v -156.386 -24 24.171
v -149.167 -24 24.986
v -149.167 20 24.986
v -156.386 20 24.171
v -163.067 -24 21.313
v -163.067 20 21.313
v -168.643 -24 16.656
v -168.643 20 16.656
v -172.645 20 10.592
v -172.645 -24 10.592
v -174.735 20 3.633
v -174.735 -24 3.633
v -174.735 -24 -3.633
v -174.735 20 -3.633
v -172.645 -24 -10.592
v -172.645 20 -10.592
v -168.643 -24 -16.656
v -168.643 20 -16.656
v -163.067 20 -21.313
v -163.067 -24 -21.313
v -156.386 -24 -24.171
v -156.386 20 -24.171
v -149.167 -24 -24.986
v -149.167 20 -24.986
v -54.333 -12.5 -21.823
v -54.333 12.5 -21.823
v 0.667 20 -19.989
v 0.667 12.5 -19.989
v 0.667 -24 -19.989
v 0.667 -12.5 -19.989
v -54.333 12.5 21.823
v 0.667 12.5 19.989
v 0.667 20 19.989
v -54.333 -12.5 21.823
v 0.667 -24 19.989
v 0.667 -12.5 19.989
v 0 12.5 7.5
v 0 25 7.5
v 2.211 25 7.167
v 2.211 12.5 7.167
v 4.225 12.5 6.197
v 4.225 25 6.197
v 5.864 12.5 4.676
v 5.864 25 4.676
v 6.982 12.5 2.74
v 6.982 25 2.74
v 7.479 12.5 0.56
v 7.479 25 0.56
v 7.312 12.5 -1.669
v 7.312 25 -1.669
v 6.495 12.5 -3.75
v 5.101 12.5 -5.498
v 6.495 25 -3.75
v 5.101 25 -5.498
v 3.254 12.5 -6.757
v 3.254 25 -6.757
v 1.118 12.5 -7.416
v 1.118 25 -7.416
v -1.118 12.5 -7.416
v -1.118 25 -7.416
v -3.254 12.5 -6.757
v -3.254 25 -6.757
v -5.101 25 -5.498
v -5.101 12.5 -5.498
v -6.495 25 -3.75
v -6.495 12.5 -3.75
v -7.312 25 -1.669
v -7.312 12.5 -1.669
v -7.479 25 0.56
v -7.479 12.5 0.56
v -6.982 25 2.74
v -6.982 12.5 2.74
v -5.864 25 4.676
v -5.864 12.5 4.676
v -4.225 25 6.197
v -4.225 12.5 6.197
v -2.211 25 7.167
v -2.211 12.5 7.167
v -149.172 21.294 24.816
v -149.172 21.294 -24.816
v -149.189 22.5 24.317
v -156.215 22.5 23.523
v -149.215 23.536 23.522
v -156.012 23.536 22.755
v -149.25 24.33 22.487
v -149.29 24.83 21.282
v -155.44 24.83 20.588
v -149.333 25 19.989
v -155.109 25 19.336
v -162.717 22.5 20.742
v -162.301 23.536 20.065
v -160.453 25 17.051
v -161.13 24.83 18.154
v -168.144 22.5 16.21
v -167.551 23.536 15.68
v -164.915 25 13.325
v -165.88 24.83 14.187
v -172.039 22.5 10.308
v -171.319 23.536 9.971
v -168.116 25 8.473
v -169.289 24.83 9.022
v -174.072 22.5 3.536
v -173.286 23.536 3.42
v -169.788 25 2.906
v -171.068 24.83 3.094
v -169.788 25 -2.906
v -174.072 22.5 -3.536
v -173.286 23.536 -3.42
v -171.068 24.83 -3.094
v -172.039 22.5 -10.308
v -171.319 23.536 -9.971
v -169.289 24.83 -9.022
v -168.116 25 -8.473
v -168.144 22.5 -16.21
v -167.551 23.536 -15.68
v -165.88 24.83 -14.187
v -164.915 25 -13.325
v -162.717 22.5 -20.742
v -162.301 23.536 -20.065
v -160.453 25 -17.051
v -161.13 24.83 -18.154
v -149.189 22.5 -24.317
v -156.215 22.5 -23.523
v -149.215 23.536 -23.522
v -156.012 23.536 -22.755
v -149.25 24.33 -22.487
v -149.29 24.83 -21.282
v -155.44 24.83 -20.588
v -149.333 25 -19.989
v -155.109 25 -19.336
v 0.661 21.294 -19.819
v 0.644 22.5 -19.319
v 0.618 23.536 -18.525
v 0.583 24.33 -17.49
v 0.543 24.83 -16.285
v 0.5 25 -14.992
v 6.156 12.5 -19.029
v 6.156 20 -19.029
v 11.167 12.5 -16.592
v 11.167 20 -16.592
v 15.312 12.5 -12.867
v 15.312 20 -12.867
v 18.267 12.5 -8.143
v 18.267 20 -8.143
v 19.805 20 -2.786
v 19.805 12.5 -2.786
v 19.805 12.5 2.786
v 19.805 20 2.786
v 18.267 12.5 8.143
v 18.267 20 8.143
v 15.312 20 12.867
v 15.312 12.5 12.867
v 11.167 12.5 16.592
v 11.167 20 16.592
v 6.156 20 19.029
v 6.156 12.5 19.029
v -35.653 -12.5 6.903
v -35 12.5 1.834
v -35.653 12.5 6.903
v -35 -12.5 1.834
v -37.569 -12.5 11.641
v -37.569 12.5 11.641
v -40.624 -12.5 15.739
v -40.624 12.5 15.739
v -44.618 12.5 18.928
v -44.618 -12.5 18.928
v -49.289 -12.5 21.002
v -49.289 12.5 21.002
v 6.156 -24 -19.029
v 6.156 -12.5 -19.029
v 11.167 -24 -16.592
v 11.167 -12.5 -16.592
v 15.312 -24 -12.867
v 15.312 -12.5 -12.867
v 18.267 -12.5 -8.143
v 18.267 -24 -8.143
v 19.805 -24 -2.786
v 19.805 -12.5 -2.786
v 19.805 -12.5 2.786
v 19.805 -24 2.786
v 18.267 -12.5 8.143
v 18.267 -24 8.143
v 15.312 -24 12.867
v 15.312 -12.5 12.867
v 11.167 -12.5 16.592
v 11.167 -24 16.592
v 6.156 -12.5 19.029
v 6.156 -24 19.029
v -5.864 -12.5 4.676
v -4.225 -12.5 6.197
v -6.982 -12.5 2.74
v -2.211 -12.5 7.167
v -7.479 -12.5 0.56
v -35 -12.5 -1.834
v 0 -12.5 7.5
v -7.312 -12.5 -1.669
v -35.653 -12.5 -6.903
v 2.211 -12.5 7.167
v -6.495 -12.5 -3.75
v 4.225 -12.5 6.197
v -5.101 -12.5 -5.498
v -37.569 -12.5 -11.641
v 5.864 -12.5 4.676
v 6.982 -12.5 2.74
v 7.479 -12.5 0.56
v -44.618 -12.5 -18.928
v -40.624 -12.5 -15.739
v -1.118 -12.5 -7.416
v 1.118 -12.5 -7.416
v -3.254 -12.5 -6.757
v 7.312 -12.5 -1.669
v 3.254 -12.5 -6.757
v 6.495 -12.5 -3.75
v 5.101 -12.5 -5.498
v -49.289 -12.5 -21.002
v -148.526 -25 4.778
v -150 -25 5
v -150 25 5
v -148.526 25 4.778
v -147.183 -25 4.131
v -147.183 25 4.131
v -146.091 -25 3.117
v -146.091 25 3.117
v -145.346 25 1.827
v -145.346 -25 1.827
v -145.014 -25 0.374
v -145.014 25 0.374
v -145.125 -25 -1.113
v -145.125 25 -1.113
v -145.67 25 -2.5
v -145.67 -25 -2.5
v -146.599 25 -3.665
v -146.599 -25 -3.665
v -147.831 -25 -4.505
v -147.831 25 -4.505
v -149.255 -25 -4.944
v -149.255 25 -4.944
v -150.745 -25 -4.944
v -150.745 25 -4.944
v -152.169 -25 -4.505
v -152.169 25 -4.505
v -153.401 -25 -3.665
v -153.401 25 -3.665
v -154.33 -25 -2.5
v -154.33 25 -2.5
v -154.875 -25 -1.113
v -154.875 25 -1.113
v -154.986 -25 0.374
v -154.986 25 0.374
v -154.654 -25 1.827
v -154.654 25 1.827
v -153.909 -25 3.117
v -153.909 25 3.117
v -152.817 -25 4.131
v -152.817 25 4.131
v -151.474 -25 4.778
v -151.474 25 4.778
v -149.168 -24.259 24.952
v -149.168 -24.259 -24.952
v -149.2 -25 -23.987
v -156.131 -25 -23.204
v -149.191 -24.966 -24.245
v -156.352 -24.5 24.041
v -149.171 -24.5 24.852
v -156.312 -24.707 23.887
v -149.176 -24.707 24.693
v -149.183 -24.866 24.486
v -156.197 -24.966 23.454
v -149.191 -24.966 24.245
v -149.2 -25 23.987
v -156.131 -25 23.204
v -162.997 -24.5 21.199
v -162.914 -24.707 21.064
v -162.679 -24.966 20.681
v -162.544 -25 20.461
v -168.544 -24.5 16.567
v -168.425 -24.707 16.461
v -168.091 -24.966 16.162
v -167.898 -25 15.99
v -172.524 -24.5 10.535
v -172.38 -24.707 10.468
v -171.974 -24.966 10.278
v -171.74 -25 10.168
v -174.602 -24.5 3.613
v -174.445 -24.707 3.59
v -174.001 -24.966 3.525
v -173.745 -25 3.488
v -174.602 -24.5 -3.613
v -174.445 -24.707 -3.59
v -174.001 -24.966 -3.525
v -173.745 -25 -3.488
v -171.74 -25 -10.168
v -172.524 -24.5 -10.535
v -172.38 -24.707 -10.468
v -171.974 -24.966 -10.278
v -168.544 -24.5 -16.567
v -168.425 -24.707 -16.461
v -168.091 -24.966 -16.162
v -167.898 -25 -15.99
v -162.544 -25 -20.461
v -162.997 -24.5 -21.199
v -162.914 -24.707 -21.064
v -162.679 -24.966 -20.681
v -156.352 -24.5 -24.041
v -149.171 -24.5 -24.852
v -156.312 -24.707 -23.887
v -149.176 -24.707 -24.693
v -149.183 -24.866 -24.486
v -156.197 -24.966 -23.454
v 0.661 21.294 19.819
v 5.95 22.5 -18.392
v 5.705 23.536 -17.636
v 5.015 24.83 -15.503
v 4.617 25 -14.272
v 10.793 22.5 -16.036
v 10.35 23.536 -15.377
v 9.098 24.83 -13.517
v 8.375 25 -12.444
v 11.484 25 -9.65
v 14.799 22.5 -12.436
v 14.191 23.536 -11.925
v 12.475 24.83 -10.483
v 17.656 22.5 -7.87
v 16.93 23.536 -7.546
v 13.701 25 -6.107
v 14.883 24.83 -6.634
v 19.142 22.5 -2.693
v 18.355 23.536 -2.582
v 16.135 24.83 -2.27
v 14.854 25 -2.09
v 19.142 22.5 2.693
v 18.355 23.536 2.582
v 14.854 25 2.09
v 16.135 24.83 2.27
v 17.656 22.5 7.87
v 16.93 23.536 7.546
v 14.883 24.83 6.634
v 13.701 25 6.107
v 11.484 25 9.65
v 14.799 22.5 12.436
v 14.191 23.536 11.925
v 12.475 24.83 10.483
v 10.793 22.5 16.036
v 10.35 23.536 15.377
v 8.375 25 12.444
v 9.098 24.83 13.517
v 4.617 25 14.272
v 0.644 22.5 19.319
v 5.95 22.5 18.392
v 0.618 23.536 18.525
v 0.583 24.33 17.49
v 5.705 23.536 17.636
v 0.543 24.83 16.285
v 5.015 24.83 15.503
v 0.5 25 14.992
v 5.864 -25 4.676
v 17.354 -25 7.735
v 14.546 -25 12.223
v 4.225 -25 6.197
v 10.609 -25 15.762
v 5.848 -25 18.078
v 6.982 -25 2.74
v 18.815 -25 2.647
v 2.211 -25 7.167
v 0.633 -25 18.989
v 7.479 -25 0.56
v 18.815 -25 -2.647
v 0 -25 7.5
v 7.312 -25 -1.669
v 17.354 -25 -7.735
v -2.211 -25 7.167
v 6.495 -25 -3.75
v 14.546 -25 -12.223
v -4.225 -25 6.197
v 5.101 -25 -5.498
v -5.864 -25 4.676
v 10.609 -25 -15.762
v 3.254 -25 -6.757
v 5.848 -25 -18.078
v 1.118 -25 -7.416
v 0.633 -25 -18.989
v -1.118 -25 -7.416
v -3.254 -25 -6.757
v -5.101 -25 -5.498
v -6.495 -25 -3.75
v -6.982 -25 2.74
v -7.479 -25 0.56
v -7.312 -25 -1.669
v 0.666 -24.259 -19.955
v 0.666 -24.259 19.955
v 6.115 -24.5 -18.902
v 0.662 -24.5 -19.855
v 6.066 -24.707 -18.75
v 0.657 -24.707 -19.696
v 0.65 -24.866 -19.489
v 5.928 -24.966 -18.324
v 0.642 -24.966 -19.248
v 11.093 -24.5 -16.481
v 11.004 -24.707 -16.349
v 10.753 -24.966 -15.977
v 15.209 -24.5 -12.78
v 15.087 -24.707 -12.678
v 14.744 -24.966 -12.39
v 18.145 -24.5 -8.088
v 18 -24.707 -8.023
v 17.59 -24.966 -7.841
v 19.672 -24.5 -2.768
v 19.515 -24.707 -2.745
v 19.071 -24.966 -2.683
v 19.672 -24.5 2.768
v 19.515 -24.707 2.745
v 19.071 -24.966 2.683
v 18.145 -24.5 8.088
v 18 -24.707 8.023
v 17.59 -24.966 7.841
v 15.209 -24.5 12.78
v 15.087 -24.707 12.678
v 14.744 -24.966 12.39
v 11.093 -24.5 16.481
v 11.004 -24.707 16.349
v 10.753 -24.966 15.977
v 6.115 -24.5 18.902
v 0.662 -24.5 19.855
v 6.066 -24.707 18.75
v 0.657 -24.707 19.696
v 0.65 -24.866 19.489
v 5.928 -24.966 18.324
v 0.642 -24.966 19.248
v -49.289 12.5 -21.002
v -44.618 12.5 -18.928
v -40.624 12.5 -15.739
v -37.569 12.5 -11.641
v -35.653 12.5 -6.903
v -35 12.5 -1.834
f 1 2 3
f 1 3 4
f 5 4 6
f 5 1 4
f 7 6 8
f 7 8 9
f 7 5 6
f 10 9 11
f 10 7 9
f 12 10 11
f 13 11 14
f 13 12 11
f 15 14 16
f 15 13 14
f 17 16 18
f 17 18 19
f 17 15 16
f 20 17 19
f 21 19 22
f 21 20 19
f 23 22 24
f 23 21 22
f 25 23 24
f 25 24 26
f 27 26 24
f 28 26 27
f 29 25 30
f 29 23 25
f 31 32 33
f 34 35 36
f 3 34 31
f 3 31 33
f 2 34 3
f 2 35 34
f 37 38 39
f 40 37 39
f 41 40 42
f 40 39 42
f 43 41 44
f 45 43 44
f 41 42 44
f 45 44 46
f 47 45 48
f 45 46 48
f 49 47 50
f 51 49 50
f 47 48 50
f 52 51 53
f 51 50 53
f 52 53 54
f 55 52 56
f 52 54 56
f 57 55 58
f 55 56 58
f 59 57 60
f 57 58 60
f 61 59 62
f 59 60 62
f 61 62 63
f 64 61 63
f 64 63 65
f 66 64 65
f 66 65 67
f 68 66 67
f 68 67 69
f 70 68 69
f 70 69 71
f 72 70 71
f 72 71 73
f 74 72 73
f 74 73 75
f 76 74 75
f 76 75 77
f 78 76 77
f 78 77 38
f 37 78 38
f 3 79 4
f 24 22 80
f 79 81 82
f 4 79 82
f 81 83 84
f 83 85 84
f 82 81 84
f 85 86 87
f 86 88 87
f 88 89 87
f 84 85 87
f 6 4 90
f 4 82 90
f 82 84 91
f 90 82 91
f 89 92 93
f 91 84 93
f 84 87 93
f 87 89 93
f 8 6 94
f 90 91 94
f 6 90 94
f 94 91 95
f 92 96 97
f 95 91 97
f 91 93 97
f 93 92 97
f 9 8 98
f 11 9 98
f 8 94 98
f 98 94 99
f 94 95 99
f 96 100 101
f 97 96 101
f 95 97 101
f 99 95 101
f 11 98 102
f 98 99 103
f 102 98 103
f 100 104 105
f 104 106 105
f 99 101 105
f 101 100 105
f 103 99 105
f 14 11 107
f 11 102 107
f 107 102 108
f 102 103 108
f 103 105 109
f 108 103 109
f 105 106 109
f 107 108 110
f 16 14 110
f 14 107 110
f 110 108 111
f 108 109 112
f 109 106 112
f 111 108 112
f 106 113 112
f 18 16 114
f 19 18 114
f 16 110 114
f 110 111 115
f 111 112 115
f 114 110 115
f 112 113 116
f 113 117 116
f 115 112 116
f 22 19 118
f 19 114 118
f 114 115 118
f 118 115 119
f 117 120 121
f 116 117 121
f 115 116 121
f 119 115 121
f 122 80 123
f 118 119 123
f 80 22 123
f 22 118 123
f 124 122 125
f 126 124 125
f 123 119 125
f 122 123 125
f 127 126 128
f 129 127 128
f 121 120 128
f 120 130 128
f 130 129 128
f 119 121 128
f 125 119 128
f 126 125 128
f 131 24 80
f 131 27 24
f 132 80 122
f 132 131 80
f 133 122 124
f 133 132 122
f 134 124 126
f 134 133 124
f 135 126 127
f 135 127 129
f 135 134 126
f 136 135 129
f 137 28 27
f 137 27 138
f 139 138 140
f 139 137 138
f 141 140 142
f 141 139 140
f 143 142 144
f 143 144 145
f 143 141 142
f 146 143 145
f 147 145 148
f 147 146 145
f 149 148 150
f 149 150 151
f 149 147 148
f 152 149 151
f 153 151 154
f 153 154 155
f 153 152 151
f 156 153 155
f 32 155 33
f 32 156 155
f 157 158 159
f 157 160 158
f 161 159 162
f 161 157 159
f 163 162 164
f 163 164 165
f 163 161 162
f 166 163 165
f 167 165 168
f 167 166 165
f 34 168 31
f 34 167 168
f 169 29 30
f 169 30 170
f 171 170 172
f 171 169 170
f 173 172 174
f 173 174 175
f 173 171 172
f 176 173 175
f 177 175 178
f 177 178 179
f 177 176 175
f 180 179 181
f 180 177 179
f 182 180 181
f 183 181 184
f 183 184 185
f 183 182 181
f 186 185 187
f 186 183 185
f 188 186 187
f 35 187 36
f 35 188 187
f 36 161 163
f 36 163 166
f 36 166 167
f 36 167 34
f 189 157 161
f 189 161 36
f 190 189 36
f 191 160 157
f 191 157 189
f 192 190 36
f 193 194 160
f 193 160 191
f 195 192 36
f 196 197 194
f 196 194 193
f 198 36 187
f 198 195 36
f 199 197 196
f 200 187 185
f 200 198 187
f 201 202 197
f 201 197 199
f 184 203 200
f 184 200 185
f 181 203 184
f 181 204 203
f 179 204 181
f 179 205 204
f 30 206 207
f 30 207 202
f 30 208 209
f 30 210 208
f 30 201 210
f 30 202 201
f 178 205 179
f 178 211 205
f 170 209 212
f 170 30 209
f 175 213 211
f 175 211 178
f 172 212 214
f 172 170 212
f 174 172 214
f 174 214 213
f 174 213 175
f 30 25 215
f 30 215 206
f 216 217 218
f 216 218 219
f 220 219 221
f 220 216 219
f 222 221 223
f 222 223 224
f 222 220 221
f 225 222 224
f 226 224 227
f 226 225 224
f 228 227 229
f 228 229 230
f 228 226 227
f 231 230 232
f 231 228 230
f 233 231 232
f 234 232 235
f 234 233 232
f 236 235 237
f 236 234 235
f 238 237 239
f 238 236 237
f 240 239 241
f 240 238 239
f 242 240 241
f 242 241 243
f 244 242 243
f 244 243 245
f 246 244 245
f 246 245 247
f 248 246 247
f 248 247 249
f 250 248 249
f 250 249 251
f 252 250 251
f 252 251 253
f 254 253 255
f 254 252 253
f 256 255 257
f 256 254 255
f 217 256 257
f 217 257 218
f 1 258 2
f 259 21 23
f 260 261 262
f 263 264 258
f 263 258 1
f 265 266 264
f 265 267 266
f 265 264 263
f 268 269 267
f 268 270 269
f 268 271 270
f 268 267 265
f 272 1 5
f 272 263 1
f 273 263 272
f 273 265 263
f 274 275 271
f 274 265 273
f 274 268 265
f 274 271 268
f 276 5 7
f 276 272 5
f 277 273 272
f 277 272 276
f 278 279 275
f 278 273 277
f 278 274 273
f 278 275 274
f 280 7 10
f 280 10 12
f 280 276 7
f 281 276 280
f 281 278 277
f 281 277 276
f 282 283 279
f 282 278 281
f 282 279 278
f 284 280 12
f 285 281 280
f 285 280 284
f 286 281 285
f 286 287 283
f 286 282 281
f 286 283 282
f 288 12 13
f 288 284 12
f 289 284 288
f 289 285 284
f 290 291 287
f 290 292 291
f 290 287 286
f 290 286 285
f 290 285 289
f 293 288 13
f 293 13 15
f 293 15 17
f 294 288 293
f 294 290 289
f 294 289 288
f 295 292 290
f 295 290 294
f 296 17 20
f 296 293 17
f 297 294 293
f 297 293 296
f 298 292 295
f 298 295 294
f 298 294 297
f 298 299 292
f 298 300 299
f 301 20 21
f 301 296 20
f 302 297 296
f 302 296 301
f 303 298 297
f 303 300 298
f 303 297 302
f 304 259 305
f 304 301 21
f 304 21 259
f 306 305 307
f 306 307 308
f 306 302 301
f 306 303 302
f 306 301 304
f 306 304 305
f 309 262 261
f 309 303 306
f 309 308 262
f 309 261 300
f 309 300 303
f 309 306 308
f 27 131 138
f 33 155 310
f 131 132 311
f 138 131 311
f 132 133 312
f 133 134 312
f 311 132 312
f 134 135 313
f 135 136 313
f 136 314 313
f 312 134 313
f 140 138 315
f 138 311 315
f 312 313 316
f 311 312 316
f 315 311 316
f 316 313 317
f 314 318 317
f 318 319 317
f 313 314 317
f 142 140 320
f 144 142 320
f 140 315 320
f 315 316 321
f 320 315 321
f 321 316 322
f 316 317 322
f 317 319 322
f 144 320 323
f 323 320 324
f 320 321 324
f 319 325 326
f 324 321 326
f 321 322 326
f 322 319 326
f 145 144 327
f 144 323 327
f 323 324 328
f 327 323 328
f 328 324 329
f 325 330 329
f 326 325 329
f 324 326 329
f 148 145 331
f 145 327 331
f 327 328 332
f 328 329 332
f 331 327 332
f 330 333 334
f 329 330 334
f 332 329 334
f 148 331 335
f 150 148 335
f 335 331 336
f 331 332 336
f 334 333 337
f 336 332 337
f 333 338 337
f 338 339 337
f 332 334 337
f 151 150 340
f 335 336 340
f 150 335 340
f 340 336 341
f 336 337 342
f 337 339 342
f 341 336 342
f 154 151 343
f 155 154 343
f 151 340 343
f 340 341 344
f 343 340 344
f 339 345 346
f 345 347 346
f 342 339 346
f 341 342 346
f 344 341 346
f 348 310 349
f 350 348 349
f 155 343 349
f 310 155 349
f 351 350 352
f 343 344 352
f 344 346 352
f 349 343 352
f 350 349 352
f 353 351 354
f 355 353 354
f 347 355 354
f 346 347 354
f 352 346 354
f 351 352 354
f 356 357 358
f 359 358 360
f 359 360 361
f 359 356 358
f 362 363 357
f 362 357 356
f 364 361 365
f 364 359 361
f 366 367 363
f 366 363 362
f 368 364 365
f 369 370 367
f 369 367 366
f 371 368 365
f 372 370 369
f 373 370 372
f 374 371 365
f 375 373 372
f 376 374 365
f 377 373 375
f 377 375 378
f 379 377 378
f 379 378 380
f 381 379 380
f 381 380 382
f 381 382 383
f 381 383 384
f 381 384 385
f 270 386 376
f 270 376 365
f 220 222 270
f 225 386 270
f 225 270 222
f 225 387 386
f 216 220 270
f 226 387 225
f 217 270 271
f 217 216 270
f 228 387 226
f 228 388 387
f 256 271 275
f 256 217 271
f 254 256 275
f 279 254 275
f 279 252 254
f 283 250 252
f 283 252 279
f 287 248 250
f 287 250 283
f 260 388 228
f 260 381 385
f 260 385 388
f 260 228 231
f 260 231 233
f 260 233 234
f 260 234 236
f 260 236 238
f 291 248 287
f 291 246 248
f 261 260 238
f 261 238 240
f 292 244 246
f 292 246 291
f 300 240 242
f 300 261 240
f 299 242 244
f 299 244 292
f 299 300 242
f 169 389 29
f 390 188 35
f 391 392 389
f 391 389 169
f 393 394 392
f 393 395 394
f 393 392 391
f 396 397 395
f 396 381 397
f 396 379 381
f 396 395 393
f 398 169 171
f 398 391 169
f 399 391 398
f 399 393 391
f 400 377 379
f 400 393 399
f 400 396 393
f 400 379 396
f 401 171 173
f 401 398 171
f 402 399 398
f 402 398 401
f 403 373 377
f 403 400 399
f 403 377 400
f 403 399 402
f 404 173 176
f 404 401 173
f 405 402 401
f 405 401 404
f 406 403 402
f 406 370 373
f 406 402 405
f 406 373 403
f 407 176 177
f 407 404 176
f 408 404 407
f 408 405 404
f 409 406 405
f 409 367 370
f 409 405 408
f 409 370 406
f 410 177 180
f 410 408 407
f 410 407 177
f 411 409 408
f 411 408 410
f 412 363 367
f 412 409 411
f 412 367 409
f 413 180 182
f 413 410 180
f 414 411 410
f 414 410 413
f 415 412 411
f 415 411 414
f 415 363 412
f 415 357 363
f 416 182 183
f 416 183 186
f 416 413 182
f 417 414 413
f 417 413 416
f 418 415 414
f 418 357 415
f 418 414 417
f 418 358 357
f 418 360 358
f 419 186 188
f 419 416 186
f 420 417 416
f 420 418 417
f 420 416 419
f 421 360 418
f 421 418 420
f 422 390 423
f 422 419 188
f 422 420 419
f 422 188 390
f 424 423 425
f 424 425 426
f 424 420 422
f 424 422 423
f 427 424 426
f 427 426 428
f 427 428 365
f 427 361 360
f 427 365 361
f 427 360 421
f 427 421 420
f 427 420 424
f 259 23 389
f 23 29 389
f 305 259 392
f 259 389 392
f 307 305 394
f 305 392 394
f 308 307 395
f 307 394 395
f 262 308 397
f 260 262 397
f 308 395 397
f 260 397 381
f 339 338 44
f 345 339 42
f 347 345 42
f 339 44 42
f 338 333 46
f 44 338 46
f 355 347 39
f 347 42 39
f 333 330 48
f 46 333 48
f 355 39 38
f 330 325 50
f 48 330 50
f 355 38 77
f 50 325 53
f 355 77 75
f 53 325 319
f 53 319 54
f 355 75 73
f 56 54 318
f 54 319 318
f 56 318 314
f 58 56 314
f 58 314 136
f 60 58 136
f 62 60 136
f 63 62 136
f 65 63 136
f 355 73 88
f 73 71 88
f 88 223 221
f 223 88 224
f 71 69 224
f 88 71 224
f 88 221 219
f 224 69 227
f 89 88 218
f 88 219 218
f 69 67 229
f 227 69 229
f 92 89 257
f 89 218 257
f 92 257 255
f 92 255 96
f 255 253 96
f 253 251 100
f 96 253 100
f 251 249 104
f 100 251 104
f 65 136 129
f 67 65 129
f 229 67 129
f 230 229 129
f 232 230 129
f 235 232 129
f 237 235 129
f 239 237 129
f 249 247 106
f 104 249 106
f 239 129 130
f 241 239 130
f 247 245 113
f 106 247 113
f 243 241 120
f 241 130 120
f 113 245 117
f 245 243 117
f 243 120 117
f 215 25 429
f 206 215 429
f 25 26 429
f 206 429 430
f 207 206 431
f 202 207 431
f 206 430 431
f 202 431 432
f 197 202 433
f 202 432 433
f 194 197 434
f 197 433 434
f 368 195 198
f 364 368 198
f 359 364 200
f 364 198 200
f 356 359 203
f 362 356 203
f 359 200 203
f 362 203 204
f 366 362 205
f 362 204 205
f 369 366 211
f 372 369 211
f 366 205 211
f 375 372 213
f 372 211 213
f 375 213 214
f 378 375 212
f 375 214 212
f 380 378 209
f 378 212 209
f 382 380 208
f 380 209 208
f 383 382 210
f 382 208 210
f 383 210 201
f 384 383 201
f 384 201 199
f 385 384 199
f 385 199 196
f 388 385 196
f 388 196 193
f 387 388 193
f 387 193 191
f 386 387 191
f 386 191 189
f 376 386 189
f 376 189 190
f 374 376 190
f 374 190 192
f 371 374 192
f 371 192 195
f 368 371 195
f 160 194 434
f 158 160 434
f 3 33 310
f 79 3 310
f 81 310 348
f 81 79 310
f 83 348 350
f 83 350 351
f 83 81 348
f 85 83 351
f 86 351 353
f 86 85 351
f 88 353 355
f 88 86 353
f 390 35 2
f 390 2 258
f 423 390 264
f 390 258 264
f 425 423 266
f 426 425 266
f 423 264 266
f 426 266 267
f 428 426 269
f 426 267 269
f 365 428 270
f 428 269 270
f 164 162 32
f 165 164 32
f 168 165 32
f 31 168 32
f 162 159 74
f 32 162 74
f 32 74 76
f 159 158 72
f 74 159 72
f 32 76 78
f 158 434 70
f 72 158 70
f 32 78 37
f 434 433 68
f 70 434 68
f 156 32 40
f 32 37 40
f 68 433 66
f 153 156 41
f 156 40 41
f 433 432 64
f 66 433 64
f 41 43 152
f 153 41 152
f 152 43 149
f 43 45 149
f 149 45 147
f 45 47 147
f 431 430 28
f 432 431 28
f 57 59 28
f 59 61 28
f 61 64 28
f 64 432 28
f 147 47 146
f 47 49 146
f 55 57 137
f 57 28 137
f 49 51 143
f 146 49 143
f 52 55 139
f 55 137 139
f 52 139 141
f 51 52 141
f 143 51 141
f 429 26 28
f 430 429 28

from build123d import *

# Parameters (mm, degrees)
SALIENTE_EXTRUIR1_DEPTH      = 25
SALIENTE_EXTRUIR1_DEPTH_BACK = 25
CROQUIS1_R                   = 5
REDONDEO9_R                  = 1
CORTAR_EXTRUIR1_DEPTH        = 49
CORTAR_EXTRUIR1_DEPTH_BACK   = 47
CROQUIS3_W                   = 70
CROQUIS3_H                   = 25
REDONDEO10_R                 = 20
CROQUIS4_R                   = 7.5
CORTAR_EXTRUIR2_DEPTH        = 65
REDONDEO11_R                 = 5


with BuildPart() as part:
    # Croquis1 → Saliente-Extruir1 (new, two sides: drawn at the far end of the back side and taken through both)
    with BuildSketch(Plane(origin=(0, 0, 0), x_dir=(1, 0, 0), z_dir=(0, 1, 0)).offset(-SALIENTE_EXTRUIR1_DEPTH_BACK)):
        with BuildLine():
            Line((-149.166666667, 24.986107251), (0.666666667, 19.988885801))
            ThreePointArc((0.666666667, 19.988885801), (20, 0), (0.666666667, -19.988885801))
            Line((0.666666667, -19.988885801), (-149.166666667, -24.986107251))
            ThreePointArc((-149.166666667, -24.986107251), (-175, 0), (-149.166666667, 24.986107251))
        make_face()
        with Locations((-150, 0)):
            Circle(CROQUIS1_R, mode=Mode.SUBTRACT)
    extrude(amount=SALIENTE_EXTRUIR1_DEPTH + SALIENTE_EXTRUIR1_DEPTH_BACK)

    # Redondeo9
    redondeo9_edges = [part.edges().sort_by_distance(p)[0] for p in [
        (-175, -25, 0),
        (-74.25, -25, -22.487496526),
        (20, -25, 0),
        (-74.25, -25, 22.487496526),
    ]]
    fillet(redondeo9_edges, radius=REDONDEO9_R)

    # Croquis3 → Cortar-Extruir1 (cut, two sides: drawn at the far end of the back side and taken through both)
    with BuildSketch(Plane.XY.offset(-CORTAR_EXTRUIR1_DEPTH_BACK)):
        Rectangle(CROQUIS3_W, CROQUIS3_H)
    extrude(amount=CORTAR_EXTRUIR1_DEPTH + CORTAR_EXTRUIR1_DEPTH_BACK, mode=Mode.SUBTRACT)

    # Redondeo10
    redondeo10_edges = [part.edges().sort_by_distance(p)[0] for p in [
        (-35, 0, -21.178435734),
        (-35, 0, 21.178435734),
    ]]
    fillet(redondeo10_edges, radius=REDONDEO10_R)

    # Croquis4 → Cortar-Extruir2 (cut)
    with BuildSketch(Plane(origin=(0, 25, 0), x_dir=(1, 0, 0), z_dir=(0, 1, 0))):
        Circle(CROQUIS4_R)
    extrude(amount=-CORTAR_EXTRUIR2_DEPTH, mode=Mode.SUBTRACT)

    # Redondeo11
    redondeo11_edges = [part.edges().sort_by_distance(p)[0] for p in [
        (20, 25, 0),
        (-74.25, 25, 22.487496526),
        (-175, 25, 0),
        (-74.25, 25, -22.487496526),
    ]]
    fillet(redondeo11_edges, radius=REDONDEO11_R)


solid = part.part
